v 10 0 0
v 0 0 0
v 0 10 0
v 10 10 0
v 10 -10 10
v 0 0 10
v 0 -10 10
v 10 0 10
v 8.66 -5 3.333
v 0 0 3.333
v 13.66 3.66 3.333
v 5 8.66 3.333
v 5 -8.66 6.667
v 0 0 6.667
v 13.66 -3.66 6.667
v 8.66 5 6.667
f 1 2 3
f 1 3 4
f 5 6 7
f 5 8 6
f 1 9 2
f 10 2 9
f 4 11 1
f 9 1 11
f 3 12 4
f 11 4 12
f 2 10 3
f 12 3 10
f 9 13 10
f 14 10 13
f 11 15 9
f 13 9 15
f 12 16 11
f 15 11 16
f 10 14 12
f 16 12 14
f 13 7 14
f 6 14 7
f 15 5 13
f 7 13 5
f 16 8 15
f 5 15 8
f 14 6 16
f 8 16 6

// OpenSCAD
// The 2D profile is re-tessellated before a twisted sweep, independently of the
// slice count: with slices pinned, the mesh still changes with $fa/$fs. This is
// the dominant error term if a renderer only fixes the slice rule.
linear_extrude(height=10, twist=90, slices=3, $fa=3, $fs=0.5) square(10);
